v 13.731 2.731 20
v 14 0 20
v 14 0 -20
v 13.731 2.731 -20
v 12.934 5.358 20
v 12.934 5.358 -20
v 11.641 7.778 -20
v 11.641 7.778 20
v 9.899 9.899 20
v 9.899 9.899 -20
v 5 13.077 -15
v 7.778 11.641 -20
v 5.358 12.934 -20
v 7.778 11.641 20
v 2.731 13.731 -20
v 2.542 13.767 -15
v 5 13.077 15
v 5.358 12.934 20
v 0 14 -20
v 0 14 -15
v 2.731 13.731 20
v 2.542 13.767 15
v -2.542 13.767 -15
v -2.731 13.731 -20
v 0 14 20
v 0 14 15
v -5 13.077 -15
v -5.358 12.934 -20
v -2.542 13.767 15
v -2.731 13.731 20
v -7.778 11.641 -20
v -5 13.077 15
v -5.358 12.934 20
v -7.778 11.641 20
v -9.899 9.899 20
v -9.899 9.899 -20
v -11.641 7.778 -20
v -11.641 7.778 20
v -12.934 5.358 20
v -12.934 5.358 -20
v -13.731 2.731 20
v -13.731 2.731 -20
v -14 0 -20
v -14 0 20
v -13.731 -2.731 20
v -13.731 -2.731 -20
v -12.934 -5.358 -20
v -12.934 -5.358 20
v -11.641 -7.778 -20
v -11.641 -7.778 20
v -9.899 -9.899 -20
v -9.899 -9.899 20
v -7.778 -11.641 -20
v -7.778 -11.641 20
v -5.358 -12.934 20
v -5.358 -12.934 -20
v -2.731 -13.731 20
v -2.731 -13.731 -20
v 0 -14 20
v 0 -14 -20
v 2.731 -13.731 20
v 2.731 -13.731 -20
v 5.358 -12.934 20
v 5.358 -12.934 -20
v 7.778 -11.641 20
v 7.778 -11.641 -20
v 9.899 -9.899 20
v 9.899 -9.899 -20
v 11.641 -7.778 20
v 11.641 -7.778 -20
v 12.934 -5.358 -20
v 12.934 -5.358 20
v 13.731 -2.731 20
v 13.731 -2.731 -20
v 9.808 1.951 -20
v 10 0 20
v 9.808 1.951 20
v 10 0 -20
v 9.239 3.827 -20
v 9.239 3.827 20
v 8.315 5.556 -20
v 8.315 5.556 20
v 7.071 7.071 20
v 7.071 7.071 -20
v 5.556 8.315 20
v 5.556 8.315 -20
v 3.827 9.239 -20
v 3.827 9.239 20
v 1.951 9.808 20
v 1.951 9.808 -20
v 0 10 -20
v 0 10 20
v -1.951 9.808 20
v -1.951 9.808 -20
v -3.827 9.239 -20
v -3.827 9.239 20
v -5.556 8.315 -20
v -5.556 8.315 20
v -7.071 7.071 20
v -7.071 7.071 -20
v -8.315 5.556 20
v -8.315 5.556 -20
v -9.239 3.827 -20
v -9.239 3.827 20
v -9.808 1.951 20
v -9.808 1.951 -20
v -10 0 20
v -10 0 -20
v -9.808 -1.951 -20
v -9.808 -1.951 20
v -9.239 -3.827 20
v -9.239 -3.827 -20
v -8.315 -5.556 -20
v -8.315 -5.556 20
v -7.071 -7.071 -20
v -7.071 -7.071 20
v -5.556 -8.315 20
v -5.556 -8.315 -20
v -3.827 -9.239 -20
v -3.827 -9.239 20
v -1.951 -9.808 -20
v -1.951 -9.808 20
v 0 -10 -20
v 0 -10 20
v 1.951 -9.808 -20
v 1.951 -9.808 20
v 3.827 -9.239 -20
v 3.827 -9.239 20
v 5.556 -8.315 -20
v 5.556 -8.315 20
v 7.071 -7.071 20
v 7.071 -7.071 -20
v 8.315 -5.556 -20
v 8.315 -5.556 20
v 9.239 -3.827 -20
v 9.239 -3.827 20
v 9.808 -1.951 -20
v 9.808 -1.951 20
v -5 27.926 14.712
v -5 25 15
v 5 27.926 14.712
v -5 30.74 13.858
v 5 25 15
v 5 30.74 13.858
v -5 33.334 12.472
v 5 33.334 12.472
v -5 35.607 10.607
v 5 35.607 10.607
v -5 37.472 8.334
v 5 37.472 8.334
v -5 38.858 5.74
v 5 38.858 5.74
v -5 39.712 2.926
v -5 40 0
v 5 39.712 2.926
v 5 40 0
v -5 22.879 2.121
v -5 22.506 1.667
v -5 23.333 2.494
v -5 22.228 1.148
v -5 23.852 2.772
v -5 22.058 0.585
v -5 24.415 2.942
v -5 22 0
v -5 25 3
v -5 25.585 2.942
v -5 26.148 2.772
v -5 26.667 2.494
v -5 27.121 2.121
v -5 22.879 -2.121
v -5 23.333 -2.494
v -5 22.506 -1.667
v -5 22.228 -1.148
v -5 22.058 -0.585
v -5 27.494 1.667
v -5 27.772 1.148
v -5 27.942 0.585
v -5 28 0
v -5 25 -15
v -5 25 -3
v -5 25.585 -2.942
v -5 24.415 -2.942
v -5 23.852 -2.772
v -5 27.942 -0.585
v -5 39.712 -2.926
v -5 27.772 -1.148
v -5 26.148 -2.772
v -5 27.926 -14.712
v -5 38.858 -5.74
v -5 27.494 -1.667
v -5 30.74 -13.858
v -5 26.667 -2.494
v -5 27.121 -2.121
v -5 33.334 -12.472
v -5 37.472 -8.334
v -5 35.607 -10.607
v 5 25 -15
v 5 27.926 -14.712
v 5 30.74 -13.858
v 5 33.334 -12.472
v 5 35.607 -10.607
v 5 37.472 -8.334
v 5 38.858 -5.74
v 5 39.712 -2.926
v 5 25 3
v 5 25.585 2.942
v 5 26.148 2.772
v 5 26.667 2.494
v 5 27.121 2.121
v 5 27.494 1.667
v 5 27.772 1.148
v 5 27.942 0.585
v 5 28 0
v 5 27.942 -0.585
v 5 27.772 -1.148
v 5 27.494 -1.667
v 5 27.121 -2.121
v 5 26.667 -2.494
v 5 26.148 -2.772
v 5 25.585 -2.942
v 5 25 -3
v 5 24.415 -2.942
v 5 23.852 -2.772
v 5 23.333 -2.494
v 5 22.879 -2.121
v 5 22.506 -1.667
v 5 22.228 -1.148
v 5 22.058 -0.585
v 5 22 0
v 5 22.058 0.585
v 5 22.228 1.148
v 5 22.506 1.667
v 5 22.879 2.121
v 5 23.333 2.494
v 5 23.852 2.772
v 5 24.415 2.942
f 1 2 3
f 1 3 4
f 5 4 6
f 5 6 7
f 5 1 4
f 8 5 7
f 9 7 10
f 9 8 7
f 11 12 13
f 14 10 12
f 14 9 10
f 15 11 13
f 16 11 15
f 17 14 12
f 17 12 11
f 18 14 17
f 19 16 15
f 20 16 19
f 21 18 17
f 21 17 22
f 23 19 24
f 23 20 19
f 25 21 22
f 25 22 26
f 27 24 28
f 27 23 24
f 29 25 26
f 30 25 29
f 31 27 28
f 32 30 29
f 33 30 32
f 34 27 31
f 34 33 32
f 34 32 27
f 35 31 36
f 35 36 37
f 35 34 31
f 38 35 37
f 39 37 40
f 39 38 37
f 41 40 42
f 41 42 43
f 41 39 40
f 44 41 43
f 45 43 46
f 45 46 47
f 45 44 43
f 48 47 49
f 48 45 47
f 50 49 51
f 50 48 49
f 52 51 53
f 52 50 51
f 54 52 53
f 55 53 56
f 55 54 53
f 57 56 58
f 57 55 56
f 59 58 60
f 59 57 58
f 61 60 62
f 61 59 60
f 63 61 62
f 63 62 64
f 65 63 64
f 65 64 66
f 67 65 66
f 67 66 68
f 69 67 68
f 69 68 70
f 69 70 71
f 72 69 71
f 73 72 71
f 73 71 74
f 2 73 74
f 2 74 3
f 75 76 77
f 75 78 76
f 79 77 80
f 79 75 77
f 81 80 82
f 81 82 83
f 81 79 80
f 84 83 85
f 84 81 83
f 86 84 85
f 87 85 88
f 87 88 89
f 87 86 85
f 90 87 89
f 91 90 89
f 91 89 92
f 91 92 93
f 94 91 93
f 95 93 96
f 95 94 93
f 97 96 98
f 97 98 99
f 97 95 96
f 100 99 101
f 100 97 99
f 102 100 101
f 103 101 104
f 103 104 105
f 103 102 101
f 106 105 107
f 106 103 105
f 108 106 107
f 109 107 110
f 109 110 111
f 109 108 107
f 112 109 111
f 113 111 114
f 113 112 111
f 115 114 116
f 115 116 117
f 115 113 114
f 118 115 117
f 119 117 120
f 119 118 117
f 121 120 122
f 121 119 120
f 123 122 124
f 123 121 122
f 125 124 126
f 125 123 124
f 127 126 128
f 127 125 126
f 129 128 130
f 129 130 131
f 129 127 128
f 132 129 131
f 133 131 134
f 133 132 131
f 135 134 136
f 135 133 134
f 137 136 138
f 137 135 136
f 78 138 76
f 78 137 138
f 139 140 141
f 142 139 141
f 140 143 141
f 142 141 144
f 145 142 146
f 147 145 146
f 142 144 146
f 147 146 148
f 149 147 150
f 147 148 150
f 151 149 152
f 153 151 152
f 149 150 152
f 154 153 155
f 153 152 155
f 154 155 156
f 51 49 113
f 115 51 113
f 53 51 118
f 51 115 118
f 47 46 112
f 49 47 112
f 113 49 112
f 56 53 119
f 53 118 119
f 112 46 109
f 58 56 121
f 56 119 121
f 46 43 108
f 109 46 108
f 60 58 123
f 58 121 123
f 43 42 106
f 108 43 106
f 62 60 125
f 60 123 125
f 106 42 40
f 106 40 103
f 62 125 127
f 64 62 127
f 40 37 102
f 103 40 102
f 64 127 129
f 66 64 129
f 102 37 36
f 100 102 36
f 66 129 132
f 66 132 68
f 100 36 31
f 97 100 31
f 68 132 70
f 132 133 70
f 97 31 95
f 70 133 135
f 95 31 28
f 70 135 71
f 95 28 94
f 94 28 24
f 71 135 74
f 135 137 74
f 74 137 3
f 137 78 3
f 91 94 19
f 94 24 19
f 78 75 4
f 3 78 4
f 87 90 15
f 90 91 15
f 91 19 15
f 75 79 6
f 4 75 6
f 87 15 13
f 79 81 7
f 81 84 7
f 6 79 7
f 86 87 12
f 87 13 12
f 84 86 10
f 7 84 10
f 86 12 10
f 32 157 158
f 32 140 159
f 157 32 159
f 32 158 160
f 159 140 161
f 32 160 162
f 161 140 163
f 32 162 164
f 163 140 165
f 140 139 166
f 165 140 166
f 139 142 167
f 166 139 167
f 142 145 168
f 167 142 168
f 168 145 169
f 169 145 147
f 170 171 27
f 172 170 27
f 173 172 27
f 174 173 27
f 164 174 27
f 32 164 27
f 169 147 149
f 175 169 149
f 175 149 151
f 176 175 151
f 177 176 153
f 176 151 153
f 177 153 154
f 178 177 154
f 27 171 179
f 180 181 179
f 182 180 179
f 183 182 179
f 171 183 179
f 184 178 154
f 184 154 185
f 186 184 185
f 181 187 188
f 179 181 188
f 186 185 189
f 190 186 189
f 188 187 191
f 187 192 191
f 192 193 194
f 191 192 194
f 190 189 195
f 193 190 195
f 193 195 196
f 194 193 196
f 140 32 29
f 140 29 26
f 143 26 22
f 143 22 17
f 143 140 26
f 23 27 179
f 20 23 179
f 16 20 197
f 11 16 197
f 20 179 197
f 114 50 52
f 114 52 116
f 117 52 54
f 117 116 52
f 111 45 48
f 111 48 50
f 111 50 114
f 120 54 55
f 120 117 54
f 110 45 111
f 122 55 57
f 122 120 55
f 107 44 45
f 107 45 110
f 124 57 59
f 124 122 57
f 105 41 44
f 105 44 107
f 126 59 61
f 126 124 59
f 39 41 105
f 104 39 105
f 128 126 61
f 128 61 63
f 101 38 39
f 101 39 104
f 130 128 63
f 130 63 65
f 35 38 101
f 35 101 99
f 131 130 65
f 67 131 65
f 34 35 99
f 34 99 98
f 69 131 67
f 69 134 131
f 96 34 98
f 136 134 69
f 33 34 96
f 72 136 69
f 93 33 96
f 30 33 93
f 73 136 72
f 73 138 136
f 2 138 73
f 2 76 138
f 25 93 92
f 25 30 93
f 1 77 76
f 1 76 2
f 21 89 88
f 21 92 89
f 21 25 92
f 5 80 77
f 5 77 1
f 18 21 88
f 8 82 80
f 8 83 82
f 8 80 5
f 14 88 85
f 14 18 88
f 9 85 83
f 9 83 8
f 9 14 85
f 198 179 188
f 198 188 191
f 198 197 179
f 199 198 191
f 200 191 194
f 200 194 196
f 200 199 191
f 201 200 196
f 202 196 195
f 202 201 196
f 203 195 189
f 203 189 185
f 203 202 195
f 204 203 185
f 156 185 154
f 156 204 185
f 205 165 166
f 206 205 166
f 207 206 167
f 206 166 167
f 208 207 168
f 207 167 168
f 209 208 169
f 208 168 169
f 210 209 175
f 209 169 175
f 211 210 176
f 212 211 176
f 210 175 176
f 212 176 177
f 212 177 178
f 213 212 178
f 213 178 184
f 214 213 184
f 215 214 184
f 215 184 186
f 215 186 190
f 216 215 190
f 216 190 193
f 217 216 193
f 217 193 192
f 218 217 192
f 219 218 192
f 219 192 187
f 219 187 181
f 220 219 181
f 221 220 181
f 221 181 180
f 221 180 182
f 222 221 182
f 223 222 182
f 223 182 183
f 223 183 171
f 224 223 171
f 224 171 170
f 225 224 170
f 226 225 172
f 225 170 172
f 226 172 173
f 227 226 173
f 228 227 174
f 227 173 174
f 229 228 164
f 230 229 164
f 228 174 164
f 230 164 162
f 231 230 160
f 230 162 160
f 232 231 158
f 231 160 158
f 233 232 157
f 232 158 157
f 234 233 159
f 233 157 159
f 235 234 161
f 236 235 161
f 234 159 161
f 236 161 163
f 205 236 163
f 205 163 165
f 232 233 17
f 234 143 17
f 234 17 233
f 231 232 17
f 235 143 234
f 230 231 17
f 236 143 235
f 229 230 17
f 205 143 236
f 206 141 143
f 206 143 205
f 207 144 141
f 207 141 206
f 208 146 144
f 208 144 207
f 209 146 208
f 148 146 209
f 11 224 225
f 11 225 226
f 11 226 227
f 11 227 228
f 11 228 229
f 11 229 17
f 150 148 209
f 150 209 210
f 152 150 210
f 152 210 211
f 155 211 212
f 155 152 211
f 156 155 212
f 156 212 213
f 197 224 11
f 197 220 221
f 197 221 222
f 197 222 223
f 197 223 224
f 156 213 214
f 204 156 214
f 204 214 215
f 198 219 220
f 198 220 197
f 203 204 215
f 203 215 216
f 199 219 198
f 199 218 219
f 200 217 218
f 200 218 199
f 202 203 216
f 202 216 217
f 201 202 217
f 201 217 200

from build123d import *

# Parameters (mm, degrees)
SKETCH1_R                = 14
SKETCH1_R_2              = 10
BOSS_EXTRUDE1_DEPTH      = 20
BOSS_EXTRUDE2_REACH      = 61.262
BOSS_EXTRUDE2_END_RADIUS = 14
SKETCH4_W                = 10
SKETCH4_H                = 30
FILLET1_R                = 15
CUT_EXTRUDE1_REACH       = 50.59
SKETCH5_R                = 3


with BuildPart() as part:
    # Sketch1 → Boss-Extrude1 (new, symmetric)
    with BuildSketch(Plane.XY):
        Circle(SKETCH1_R)
        Circle(SKETCH1_R_2, mode=Mode.SUBTRACT)
    extrude(amount=BOSS_EXTRUDE1_DEPTH, both=True)

    # Boss-Extrude2: up to this cylinder (the profile starts outside it)
    boss_extrude2_end = Plane(origin=(0, 0, 0), z_dir=(0, 0, -1)) * Cylinder(BOSS_EXTRUDE2_END_RADIUS, 151.524, mode=Mode.PRIVATE)
    # Sketch4 → Boss-Extrude2 (add, up to the surface)
    with BuildSketch(Plane(origin=(0, 40, 0), x_dir=(1, 0, 0), z_dir=(0, 1, 0)), mode=Mode.PRIVATE) as boss_extrude2_sk1:
        Rectangle(SKETCH4_W, SKETCH4_H)
    boss_extrude2_tool1 = extrude(boss_extrude2_sk1.sketch, amount=-BOSS_EXTRUDE2_REACH, mode=Mode.PRIVATE) - boss_extrude2_end
    add(boss_extrude2_tool1.solids().sort_by_distance((0, 40, 0))[0])

    # Fillet1
    fillet1_edges = [part.edges().sort_by_distance(p)[0] for p in [
        (0, 40, 15),
        (0, 40, -15),
    ]]
    fillet(fillet1_edges, radius=FILLET1_R - 0.0001)  # a hair under: the kernel refuses the full size

    # Sketch5 → Cut-Extrude1 (cut, up to next)
    with BuildSketch(Plane.ZY.offset(5), mode=Mode.PRIVATE) as cut_extrude1_sk1:
        with Locations((0, 25)):
            Circle(SKETCH5_R)
    cut_extrude1_tool1 = extrude(cut_extrude1_sk1.sketch, amount=-CUT_EXTRUDE1_REACH, mode=Mode.PRIVATE) & part.part
    add(cut_extrude1_tool1.solids().sort_by_distance((-5, 25, 0))[0], mode=Mode.SUBTRACT)


solid = part.part
